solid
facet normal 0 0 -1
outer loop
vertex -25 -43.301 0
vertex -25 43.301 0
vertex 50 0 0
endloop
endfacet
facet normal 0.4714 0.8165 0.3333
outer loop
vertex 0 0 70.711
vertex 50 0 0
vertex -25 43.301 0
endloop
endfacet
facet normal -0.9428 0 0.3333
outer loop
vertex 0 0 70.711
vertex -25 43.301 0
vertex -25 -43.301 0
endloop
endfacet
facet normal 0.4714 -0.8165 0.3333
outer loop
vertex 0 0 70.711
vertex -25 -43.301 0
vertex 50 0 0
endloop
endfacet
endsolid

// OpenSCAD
radius = 50;

a = [1, 0, 0];
b = [cos(120), sin(120), 0];
c = [cos(120), -sin(120), 0];

function hypot(x,y) = sqrt(x * x + y * y);
side = hypot(a[0] - b[0], a[1] - b[1]);
height = sqrt(side * side - 1);
echo(a);
echo(b);
echo(side);
d = [0, 0, height];

scale(radius) polyhedron(
    points=[a,b,c,d], faces=[[0,1,2],[1,0,3],[2,1,3],[0,2,3]]);
